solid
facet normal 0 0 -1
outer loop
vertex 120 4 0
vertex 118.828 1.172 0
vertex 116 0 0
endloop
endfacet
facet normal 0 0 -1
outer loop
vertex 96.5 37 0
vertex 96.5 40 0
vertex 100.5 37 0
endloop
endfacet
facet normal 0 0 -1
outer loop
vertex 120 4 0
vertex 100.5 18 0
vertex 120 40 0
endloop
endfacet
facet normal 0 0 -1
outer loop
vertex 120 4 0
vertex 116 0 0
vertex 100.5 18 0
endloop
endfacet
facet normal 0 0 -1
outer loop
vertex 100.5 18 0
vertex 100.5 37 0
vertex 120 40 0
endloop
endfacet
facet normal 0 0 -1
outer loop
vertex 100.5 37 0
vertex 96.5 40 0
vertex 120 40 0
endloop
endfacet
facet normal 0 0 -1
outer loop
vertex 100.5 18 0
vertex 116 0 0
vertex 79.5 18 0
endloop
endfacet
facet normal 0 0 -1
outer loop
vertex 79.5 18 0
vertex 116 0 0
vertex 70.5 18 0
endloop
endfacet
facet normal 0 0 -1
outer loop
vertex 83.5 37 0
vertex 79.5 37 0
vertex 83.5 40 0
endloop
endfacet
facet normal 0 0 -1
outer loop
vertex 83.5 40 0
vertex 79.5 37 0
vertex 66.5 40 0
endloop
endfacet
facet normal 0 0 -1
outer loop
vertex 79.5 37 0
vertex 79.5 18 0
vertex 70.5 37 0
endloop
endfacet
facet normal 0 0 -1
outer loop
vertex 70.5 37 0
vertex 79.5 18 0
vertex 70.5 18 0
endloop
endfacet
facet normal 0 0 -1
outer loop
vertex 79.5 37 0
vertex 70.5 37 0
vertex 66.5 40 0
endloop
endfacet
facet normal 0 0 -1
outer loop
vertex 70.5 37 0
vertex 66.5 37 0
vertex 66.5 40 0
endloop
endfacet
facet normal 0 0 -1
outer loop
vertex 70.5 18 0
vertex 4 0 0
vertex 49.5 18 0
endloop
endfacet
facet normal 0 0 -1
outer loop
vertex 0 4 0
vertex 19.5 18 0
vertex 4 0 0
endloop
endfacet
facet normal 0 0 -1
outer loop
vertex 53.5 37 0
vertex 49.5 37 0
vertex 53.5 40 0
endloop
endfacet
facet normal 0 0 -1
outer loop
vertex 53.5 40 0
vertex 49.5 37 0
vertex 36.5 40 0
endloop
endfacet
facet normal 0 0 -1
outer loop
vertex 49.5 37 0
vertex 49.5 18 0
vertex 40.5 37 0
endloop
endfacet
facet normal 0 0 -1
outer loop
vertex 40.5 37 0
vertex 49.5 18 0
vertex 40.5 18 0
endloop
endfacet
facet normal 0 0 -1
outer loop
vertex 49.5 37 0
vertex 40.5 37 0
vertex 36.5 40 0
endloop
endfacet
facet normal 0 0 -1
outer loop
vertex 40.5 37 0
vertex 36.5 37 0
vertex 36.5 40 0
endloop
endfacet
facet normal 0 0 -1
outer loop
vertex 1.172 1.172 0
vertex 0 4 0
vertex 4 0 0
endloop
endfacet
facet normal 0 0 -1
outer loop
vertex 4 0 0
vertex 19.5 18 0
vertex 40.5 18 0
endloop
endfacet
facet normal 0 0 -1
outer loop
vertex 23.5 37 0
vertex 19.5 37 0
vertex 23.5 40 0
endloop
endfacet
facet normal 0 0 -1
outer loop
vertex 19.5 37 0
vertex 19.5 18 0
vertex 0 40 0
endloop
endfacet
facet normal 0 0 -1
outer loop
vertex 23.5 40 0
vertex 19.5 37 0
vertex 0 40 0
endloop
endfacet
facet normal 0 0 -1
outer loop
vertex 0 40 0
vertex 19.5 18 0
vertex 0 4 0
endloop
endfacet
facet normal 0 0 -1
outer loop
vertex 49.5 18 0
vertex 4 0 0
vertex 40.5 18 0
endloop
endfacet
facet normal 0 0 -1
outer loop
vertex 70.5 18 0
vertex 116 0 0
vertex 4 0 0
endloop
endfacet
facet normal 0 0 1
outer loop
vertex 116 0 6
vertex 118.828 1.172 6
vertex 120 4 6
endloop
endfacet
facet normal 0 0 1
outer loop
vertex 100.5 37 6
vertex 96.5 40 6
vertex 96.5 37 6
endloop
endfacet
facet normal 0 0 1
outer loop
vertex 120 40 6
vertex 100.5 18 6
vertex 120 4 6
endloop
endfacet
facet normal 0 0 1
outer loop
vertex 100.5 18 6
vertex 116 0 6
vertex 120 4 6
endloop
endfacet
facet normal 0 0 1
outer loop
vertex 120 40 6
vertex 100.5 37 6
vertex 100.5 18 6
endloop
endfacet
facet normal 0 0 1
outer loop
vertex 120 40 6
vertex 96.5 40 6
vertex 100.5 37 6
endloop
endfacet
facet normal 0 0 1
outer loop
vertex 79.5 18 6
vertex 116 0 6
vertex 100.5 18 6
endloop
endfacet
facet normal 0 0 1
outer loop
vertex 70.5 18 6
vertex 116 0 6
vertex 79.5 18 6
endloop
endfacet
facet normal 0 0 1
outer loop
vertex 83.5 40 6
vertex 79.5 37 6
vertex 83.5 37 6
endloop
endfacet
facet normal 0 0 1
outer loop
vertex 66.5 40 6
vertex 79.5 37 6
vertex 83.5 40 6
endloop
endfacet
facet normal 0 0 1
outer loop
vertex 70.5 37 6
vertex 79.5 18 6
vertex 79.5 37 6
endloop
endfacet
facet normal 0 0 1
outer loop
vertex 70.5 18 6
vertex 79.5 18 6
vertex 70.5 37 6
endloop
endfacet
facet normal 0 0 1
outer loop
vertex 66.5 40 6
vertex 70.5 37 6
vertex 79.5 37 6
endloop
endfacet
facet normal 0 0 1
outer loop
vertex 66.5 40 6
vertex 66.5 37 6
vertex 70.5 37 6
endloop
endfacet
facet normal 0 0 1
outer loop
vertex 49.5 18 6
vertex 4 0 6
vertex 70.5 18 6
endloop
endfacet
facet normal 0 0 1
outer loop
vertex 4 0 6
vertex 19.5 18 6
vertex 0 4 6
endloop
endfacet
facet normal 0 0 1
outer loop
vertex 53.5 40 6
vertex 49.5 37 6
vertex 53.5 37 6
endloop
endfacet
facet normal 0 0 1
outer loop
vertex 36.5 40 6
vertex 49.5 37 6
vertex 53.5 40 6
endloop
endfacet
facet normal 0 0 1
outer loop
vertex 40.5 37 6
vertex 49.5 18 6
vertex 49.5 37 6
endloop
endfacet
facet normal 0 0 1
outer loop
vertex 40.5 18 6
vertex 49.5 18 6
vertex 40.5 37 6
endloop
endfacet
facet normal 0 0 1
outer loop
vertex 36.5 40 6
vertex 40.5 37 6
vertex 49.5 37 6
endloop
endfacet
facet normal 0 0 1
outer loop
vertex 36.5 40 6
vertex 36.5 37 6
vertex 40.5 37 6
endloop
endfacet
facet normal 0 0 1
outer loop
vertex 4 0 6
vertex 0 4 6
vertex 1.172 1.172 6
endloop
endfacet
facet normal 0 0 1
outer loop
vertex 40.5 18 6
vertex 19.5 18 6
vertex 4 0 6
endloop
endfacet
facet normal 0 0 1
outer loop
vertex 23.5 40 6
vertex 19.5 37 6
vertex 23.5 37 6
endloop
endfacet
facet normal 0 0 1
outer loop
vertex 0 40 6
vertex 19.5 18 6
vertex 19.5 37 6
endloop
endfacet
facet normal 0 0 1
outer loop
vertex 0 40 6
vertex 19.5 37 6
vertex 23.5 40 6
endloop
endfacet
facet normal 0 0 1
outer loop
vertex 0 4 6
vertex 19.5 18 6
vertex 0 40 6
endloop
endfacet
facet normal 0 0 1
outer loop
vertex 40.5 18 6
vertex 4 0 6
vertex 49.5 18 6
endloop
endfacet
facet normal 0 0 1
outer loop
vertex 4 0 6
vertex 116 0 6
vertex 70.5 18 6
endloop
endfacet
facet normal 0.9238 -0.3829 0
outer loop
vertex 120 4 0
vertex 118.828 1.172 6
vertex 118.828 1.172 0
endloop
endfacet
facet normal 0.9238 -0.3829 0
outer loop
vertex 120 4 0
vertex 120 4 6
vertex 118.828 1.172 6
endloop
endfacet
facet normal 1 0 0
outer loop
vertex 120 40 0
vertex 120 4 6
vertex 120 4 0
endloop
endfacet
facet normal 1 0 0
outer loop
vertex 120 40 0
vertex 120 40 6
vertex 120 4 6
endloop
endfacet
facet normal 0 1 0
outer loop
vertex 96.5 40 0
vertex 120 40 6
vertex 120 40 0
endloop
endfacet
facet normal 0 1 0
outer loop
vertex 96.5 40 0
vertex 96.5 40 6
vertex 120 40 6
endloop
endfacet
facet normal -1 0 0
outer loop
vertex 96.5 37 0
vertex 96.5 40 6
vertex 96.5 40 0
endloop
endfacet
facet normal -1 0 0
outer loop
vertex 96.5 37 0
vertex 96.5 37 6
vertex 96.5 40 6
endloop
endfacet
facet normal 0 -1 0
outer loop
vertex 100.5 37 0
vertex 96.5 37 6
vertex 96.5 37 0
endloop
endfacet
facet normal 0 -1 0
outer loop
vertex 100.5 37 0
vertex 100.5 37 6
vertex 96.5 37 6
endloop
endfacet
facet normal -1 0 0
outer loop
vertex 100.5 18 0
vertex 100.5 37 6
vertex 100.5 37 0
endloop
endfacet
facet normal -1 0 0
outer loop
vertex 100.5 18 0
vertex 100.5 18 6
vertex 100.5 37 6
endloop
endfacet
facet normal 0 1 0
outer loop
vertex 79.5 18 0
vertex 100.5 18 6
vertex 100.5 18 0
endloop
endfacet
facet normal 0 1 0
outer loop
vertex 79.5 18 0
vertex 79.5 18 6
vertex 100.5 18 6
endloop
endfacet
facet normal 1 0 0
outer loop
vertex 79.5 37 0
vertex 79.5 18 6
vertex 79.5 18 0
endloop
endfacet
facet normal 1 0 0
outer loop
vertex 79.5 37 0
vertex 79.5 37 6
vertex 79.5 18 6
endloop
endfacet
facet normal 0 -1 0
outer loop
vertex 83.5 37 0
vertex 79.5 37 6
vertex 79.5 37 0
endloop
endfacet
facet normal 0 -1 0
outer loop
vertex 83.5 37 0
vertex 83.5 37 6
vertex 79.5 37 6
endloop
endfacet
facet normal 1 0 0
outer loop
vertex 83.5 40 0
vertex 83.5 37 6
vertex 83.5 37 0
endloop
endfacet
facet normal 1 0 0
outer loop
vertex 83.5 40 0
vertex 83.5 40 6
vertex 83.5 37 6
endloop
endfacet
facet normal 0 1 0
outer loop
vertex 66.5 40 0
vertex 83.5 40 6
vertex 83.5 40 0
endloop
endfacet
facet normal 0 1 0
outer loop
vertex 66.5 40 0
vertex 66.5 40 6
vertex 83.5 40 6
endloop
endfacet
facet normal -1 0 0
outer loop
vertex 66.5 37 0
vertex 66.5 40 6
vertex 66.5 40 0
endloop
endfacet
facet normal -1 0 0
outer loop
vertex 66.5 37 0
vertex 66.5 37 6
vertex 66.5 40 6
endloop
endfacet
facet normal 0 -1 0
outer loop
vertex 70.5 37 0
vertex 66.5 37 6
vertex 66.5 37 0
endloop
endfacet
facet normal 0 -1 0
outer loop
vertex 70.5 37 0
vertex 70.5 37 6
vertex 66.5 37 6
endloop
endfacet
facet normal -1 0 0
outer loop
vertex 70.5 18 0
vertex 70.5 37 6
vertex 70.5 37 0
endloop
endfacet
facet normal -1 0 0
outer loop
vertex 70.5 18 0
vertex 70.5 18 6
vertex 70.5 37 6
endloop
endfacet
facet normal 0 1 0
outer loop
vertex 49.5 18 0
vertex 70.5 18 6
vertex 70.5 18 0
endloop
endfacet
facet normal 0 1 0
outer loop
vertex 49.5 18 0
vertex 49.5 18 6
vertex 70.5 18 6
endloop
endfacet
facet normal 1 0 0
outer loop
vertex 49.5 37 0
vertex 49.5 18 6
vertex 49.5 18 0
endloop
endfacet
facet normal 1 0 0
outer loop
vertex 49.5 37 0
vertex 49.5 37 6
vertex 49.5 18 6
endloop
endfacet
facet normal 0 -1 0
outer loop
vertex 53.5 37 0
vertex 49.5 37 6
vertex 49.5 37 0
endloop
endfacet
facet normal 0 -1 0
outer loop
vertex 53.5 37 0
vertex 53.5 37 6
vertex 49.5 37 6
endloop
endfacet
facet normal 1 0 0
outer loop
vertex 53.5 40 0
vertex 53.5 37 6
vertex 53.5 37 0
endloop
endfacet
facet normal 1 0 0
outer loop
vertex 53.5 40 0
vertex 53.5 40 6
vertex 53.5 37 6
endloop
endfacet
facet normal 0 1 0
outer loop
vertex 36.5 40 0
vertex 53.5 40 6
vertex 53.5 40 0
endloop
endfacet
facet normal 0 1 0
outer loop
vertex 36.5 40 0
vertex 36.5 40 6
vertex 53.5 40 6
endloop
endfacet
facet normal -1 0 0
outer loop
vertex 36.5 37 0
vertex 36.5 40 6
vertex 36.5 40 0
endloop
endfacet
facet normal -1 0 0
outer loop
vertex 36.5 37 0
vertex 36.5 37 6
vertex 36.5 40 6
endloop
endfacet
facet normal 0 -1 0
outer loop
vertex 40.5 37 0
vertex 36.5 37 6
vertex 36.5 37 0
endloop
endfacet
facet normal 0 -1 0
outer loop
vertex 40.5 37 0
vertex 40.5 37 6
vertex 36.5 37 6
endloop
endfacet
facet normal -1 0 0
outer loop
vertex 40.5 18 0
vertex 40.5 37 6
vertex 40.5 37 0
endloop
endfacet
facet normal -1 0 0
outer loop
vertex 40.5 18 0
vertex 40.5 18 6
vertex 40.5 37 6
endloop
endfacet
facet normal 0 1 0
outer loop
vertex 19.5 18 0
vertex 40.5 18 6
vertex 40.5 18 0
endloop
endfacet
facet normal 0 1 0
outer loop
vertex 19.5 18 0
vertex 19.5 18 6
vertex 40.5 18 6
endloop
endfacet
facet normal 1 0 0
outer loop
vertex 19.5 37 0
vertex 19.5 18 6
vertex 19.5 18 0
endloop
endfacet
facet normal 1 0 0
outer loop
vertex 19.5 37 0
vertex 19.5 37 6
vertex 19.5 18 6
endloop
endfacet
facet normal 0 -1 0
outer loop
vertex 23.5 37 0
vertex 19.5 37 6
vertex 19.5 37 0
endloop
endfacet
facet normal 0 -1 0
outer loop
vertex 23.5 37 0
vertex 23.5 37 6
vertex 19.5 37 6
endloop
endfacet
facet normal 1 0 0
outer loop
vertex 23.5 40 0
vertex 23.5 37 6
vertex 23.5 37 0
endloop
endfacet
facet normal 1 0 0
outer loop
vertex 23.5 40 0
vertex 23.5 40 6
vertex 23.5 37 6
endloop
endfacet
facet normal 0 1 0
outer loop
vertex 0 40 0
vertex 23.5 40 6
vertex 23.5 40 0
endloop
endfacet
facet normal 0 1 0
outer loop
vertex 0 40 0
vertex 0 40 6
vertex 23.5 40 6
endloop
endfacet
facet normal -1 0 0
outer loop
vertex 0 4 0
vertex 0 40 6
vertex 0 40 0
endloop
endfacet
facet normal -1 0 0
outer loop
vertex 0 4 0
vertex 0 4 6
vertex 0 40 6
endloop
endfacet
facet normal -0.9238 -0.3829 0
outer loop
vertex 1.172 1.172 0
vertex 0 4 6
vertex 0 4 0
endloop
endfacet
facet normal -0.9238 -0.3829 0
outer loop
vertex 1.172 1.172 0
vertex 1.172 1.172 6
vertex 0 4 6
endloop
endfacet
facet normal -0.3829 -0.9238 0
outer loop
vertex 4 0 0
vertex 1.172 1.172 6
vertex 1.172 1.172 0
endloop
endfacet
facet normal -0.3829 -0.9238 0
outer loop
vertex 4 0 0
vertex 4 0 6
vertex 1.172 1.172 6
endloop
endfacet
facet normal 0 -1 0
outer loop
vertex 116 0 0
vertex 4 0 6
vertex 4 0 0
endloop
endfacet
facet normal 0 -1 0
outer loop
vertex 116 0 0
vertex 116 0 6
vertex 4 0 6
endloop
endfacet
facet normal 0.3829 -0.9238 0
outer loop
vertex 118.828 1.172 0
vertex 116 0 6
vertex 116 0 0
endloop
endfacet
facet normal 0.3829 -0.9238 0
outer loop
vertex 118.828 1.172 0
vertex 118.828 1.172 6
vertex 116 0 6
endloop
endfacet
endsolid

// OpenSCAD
$fn = 32;

// ----------------------------------------------------------------------
// Oversize slot bar: 120 mm bar with 3 oversize windows
// ----------------------------------------------------------------------

// --- parameters (mm) ---
profile_height = 6;       // extrusion height
profile_points = 32;      // points of the closed outline

profile = [[0, 4], [1.172, 1.172], [4, 0], [116, 0], [118.828, 1.172], [120, 4], [120, 40], [96.5, 40], [96.5, 37], [100.5, 37], [100.5, 18], [79.5, 18], [79.5, 37], [83.5, 37], [83.5, 40], [66.5, 40], [66.5, 37], [70.5, 37], [70.5, 18], [49.5, 18], [49.5, 37], [53.5, 37], [53.5, 40], [36.5, 40], [36.5, 37], [40.5, 37], [40.5, 18], [19.5, 18], [19.5, 37], [23.5, 37], [23.5, 40], [0, 40]];  // single closed polygon, 32 points, counter clockwise

// --- the one profile operation ---
linear_extrude(height = profile_height) polygon(points = profile);
